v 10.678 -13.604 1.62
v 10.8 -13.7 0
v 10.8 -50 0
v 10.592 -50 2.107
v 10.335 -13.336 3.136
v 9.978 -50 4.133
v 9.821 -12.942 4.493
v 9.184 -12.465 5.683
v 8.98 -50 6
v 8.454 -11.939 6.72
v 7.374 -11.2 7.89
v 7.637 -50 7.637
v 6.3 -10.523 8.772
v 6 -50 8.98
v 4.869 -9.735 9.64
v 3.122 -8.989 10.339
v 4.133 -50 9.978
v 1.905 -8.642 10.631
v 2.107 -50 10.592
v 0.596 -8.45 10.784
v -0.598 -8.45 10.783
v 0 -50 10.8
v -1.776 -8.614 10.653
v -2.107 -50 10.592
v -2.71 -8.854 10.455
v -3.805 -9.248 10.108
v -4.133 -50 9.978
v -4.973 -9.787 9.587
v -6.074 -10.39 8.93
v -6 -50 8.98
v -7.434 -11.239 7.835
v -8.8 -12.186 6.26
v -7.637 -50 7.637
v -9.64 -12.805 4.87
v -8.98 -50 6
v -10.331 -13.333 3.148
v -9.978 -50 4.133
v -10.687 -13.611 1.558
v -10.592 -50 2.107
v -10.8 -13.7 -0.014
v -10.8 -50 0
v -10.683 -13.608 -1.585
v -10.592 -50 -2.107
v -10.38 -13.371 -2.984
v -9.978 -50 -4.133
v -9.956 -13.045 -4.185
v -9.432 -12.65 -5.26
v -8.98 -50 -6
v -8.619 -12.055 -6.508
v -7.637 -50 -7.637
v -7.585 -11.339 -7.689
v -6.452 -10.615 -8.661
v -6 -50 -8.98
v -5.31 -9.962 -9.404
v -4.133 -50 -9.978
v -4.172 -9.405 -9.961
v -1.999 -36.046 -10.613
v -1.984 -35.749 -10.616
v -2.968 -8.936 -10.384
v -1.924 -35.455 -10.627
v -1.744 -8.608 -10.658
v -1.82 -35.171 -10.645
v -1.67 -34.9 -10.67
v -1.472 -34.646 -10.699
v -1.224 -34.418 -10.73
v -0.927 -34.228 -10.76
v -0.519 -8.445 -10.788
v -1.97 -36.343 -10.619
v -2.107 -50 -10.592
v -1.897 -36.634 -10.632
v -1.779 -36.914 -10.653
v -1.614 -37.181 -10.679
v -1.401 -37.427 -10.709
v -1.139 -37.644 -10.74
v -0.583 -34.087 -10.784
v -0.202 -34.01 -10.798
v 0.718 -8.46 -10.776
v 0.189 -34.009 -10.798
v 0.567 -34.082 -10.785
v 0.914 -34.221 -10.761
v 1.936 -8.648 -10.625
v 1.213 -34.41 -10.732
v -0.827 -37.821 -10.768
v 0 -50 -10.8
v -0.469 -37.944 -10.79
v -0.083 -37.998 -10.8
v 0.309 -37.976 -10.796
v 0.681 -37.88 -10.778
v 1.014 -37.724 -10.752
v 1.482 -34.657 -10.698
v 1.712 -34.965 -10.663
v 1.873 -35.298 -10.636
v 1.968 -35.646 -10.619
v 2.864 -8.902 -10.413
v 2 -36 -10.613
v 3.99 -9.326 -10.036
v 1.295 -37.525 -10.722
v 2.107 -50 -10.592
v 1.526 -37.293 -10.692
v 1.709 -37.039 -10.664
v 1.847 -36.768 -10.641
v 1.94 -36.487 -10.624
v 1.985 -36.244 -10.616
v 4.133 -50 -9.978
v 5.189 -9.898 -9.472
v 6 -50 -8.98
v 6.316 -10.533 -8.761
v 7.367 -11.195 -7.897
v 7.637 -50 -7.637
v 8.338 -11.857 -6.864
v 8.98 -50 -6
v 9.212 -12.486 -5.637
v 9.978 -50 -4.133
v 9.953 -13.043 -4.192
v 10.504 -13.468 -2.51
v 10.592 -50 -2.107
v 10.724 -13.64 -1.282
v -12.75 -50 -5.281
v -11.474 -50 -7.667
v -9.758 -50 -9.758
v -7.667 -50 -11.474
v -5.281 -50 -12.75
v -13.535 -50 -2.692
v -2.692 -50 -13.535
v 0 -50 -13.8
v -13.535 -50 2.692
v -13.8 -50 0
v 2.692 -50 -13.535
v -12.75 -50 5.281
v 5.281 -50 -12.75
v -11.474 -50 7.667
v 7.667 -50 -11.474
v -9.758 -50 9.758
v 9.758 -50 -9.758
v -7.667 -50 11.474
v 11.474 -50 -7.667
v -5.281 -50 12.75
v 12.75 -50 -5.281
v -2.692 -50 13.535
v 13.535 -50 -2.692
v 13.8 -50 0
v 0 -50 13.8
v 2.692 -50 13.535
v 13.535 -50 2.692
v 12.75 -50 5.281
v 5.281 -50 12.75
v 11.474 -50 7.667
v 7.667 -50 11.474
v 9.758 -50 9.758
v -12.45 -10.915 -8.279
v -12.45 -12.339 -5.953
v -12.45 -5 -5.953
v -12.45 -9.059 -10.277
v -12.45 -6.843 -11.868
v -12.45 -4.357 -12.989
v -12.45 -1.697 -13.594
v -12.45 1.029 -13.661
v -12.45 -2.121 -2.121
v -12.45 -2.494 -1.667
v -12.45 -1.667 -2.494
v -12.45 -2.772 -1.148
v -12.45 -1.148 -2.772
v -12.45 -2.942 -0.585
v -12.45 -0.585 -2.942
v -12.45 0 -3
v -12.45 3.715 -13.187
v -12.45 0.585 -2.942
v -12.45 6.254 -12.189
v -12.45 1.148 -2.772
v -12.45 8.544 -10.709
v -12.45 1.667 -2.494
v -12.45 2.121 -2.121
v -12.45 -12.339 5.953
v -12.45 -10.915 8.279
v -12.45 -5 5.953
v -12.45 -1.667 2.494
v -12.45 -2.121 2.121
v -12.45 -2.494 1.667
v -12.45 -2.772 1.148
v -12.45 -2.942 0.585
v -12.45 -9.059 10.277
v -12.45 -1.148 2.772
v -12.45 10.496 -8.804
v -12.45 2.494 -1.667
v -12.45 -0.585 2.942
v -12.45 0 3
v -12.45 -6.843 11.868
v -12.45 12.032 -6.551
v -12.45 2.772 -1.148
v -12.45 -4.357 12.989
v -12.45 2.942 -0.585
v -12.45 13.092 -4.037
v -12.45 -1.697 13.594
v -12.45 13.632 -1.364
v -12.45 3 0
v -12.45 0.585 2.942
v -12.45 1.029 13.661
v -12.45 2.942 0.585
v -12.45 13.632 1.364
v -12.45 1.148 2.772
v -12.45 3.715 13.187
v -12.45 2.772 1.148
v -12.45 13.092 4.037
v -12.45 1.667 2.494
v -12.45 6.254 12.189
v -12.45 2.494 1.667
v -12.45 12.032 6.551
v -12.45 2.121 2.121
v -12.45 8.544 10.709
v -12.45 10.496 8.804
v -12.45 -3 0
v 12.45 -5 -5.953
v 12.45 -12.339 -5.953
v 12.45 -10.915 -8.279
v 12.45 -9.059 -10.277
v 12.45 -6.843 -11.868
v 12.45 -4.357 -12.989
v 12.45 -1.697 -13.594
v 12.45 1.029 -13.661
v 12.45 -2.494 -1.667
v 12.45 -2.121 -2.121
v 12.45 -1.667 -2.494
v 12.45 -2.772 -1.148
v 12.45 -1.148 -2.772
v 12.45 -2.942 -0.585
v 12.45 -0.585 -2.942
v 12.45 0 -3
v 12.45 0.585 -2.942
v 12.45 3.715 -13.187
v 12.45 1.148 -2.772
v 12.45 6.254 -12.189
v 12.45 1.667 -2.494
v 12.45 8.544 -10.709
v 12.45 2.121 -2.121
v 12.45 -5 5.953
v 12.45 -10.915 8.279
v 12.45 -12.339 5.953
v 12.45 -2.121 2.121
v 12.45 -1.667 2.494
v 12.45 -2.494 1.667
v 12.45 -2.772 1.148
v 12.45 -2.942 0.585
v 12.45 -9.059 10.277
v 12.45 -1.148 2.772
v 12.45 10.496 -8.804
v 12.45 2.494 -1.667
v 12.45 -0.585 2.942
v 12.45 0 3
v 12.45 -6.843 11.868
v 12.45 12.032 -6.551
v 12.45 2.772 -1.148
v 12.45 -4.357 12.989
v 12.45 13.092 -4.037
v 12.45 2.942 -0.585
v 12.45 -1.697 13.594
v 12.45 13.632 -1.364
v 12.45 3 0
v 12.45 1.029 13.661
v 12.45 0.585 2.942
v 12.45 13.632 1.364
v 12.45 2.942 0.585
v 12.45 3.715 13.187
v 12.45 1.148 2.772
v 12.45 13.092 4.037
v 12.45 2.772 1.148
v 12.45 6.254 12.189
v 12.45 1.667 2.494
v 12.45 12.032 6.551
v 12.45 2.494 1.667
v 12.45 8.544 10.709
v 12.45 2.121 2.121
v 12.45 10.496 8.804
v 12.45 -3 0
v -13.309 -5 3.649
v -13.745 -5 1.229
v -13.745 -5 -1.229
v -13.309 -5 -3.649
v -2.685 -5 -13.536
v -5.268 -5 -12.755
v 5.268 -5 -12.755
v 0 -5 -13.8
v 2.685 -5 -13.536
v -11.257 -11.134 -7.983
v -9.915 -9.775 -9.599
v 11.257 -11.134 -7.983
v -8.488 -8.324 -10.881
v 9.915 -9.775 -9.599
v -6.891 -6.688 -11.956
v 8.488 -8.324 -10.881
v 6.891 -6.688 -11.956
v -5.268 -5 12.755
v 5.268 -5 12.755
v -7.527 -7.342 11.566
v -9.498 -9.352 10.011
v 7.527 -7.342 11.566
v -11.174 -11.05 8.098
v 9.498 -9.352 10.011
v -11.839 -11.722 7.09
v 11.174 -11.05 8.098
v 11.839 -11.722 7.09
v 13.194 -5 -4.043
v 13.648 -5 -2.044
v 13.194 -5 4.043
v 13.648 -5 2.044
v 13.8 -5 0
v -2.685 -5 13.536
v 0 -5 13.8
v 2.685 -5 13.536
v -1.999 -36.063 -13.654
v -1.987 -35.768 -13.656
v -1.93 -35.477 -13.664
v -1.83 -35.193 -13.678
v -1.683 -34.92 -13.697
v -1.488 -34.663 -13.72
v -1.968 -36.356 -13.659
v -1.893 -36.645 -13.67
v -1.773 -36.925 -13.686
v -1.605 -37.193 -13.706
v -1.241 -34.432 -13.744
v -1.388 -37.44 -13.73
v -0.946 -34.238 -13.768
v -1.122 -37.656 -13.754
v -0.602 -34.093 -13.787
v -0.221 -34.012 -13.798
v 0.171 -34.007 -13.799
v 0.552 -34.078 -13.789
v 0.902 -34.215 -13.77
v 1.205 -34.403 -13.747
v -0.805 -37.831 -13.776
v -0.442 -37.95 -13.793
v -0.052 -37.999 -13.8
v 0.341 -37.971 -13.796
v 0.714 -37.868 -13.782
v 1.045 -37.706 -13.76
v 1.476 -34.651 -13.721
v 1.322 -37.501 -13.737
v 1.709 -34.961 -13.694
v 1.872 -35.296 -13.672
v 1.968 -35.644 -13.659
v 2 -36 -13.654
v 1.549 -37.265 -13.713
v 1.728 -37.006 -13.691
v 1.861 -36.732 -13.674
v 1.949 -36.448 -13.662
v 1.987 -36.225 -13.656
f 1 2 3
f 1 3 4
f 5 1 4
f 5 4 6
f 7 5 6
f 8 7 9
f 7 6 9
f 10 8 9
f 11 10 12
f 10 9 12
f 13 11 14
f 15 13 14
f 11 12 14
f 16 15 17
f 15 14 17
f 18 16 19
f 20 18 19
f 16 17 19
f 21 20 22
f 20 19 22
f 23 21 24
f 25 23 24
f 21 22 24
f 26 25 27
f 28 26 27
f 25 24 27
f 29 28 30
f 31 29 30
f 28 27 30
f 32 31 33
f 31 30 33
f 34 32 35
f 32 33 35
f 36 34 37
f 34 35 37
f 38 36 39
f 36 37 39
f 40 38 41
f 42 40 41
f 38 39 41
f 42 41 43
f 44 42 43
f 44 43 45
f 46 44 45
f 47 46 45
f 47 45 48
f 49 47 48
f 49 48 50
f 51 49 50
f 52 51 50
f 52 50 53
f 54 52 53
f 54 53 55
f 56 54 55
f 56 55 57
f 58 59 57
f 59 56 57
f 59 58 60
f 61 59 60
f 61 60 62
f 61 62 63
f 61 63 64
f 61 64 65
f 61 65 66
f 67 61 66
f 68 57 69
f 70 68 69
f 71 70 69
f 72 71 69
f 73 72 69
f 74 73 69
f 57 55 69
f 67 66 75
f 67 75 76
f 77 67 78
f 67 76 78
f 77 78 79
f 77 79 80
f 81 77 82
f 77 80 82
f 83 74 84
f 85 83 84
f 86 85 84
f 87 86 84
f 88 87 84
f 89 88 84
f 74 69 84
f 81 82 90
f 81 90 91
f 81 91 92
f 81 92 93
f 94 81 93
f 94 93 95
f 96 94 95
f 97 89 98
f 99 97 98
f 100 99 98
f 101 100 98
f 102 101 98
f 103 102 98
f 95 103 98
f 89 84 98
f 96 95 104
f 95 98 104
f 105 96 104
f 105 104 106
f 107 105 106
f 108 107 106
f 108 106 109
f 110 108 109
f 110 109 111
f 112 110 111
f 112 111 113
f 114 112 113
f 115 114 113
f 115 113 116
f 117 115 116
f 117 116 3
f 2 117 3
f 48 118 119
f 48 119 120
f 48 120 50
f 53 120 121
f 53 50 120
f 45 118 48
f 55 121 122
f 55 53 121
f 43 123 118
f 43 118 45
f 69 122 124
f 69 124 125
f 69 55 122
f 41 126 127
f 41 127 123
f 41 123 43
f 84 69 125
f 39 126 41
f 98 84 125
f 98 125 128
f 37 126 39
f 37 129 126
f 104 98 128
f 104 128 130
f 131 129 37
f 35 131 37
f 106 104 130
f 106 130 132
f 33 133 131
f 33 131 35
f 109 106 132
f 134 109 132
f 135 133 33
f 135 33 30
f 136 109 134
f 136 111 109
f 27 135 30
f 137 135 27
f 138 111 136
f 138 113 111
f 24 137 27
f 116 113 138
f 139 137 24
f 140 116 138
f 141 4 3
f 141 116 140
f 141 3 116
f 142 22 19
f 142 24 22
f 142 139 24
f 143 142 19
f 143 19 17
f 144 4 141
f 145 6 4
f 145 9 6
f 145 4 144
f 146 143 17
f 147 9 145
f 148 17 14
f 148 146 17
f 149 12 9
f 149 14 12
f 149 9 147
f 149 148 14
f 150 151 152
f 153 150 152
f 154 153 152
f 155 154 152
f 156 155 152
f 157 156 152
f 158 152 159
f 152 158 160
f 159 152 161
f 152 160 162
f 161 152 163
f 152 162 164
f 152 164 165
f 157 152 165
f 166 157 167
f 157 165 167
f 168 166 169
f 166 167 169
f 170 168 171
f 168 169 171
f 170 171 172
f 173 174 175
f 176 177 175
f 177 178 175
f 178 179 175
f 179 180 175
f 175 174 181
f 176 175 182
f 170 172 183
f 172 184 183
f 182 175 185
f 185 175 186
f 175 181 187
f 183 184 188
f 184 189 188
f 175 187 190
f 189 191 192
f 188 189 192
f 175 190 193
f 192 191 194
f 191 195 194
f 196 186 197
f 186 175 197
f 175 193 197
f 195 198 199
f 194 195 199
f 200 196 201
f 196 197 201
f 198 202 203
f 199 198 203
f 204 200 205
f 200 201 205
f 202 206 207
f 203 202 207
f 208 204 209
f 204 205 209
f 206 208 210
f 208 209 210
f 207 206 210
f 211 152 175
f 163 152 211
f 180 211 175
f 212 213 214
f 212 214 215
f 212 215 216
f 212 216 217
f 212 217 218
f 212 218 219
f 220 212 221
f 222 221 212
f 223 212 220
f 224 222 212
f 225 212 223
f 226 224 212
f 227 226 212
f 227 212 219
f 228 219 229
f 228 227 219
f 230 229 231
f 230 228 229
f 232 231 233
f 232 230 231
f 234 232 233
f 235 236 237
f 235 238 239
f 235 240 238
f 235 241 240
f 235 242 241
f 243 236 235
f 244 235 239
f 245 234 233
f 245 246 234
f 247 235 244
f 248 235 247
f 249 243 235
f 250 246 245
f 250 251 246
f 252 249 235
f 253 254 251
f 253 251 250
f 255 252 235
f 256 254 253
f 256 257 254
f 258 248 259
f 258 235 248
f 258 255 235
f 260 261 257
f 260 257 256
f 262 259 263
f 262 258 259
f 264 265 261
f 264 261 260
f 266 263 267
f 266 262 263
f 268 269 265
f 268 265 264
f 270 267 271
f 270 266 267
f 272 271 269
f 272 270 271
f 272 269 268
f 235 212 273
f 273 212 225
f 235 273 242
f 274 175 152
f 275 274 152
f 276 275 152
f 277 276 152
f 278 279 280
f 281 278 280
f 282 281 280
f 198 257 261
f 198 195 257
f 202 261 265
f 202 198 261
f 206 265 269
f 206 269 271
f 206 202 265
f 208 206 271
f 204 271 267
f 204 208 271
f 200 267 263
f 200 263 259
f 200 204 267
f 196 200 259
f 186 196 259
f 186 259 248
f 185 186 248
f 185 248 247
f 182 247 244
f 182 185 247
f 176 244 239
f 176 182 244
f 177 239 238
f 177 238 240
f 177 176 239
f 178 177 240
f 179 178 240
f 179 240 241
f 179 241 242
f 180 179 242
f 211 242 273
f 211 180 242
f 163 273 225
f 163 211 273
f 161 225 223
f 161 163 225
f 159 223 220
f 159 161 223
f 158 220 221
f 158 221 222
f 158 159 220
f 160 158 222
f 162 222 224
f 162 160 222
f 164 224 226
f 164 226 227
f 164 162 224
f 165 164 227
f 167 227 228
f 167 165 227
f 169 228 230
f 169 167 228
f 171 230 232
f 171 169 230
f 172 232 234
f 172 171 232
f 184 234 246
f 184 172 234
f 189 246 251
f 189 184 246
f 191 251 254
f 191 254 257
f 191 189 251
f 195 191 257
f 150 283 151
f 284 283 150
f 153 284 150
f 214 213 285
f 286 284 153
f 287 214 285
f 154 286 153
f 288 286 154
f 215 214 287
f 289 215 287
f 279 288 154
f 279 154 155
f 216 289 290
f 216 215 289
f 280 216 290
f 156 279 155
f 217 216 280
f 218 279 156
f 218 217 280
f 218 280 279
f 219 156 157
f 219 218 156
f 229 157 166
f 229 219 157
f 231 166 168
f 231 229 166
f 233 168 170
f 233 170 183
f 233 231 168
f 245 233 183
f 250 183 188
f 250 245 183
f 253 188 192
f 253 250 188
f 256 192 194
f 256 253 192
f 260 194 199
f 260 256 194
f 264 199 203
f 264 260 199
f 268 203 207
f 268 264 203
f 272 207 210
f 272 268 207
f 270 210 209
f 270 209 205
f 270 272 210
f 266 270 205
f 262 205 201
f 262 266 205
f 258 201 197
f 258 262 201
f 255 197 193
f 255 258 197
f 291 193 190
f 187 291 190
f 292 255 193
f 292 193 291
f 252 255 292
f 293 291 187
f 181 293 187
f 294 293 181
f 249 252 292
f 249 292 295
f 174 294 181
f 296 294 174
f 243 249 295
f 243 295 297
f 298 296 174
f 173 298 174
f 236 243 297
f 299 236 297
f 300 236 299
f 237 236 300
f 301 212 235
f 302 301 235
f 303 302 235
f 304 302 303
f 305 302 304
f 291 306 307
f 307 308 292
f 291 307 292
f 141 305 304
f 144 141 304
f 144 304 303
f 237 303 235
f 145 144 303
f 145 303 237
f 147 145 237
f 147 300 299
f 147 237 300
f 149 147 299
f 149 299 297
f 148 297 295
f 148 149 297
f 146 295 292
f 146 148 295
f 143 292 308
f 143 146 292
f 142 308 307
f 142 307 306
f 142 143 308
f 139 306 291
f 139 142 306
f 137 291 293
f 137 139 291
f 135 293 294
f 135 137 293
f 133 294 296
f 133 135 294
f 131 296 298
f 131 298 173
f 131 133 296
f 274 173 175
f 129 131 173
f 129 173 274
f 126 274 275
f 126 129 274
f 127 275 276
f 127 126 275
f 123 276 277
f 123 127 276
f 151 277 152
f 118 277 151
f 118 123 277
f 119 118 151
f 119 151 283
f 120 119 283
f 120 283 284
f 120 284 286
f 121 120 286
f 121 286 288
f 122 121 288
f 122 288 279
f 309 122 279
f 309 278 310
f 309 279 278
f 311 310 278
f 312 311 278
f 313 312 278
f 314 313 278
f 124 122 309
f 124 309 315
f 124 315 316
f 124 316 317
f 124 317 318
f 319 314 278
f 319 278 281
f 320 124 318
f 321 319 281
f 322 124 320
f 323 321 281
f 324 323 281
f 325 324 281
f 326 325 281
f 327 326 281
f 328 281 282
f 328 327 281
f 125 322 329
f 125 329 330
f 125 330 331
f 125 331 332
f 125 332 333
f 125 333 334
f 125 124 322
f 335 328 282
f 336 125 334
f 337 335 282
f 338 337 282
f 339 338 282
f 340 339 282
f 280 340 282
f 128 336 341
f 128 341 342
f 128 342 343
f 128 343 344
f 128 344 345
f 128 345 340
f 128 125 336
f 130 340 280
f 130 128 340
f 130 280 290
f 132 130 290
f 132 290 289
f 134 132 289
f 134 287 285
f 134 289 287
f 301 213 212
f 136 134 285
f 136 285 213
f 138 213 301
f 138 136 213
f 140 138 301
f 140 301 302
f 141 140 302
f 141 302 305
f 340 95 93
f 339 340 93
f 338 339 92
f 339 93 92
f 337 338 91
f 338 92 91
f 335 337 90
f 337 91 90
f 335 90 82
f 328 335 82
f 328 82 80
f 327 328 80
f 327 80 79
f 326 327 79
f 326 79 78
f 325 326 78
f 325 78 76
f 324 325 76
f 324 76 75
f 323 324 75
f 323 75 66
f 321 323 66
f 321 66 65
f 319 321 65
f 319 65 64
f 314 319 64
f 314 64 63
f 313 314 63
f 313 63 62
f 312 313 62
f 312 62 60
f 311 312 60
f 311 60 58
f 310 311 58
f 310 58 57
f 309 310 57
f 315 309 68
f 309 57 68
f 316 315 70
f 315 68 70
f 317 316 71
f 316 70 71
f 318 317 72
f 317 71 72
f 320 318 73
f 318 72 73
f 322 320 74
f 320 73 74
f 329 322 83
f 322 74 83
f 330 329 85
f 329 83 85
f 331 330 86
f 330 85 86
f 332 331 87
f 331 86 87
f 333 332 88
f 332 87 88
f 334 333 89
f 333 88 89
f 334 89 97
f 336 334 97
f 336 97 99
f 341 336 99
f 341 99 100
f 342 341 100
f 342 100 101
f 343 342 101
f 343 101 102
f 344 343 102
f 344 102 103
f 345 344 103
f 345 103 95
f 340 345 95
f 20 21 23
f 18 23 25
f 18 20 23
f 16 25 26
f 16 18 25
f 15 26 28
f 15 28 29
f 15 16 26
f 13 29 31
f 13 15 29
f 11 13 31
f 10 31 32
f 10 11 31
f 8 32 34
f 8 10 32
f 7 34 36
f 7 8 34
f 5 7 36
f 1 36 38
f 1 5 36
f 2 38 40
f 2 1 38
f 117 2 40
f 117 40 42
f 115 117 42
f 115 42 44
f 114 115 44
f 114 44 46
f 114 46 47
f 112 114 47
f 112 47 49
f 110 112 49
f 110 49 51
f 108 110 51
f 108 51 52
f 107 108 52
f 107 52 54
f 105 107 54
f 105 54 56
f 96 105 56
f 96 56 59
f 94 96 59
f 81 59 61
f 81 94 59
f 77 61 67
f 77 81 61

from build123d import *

# Parameters (mm, degrees)
F2_R     = 13.7
F2_R_2   = 3
F3_DEPTH = 12.45
F1_R     = 13.8
F1_R_2   = 10.8
F4_DEPTH = 45
F6_D     = 4
F6_DEPTH = 13.8010001


with BuildPart() as f3:
    # F2 (on Right) → F3 (new body, symmetric)
    with BuildSketch(Plane.YZ):
        Circle(F2_R)
        Circle(F2_R_2, mode=Mode.SUBTRACT)
    extrude(amount=F3_DEPTH, both=True)

    # F1 (on offset) → F4 (join)
    with BuildSketch(Plane.XZ.offset(50)):
        Circle(F1_R)
        Circle(F1_R_2, mode=Mode.SUBTRACT)
    extrude(amount=-F4_DEPTH)

    # F6 (through all, one way)
    with BuildSketch(Plane.XY):
        with Locations((0, -36)):
            Circle(F6_D / 2)
    extrude(amount=-F6_DEPTH, mode=Mode.SUBTRACT)


solid = f3.part
